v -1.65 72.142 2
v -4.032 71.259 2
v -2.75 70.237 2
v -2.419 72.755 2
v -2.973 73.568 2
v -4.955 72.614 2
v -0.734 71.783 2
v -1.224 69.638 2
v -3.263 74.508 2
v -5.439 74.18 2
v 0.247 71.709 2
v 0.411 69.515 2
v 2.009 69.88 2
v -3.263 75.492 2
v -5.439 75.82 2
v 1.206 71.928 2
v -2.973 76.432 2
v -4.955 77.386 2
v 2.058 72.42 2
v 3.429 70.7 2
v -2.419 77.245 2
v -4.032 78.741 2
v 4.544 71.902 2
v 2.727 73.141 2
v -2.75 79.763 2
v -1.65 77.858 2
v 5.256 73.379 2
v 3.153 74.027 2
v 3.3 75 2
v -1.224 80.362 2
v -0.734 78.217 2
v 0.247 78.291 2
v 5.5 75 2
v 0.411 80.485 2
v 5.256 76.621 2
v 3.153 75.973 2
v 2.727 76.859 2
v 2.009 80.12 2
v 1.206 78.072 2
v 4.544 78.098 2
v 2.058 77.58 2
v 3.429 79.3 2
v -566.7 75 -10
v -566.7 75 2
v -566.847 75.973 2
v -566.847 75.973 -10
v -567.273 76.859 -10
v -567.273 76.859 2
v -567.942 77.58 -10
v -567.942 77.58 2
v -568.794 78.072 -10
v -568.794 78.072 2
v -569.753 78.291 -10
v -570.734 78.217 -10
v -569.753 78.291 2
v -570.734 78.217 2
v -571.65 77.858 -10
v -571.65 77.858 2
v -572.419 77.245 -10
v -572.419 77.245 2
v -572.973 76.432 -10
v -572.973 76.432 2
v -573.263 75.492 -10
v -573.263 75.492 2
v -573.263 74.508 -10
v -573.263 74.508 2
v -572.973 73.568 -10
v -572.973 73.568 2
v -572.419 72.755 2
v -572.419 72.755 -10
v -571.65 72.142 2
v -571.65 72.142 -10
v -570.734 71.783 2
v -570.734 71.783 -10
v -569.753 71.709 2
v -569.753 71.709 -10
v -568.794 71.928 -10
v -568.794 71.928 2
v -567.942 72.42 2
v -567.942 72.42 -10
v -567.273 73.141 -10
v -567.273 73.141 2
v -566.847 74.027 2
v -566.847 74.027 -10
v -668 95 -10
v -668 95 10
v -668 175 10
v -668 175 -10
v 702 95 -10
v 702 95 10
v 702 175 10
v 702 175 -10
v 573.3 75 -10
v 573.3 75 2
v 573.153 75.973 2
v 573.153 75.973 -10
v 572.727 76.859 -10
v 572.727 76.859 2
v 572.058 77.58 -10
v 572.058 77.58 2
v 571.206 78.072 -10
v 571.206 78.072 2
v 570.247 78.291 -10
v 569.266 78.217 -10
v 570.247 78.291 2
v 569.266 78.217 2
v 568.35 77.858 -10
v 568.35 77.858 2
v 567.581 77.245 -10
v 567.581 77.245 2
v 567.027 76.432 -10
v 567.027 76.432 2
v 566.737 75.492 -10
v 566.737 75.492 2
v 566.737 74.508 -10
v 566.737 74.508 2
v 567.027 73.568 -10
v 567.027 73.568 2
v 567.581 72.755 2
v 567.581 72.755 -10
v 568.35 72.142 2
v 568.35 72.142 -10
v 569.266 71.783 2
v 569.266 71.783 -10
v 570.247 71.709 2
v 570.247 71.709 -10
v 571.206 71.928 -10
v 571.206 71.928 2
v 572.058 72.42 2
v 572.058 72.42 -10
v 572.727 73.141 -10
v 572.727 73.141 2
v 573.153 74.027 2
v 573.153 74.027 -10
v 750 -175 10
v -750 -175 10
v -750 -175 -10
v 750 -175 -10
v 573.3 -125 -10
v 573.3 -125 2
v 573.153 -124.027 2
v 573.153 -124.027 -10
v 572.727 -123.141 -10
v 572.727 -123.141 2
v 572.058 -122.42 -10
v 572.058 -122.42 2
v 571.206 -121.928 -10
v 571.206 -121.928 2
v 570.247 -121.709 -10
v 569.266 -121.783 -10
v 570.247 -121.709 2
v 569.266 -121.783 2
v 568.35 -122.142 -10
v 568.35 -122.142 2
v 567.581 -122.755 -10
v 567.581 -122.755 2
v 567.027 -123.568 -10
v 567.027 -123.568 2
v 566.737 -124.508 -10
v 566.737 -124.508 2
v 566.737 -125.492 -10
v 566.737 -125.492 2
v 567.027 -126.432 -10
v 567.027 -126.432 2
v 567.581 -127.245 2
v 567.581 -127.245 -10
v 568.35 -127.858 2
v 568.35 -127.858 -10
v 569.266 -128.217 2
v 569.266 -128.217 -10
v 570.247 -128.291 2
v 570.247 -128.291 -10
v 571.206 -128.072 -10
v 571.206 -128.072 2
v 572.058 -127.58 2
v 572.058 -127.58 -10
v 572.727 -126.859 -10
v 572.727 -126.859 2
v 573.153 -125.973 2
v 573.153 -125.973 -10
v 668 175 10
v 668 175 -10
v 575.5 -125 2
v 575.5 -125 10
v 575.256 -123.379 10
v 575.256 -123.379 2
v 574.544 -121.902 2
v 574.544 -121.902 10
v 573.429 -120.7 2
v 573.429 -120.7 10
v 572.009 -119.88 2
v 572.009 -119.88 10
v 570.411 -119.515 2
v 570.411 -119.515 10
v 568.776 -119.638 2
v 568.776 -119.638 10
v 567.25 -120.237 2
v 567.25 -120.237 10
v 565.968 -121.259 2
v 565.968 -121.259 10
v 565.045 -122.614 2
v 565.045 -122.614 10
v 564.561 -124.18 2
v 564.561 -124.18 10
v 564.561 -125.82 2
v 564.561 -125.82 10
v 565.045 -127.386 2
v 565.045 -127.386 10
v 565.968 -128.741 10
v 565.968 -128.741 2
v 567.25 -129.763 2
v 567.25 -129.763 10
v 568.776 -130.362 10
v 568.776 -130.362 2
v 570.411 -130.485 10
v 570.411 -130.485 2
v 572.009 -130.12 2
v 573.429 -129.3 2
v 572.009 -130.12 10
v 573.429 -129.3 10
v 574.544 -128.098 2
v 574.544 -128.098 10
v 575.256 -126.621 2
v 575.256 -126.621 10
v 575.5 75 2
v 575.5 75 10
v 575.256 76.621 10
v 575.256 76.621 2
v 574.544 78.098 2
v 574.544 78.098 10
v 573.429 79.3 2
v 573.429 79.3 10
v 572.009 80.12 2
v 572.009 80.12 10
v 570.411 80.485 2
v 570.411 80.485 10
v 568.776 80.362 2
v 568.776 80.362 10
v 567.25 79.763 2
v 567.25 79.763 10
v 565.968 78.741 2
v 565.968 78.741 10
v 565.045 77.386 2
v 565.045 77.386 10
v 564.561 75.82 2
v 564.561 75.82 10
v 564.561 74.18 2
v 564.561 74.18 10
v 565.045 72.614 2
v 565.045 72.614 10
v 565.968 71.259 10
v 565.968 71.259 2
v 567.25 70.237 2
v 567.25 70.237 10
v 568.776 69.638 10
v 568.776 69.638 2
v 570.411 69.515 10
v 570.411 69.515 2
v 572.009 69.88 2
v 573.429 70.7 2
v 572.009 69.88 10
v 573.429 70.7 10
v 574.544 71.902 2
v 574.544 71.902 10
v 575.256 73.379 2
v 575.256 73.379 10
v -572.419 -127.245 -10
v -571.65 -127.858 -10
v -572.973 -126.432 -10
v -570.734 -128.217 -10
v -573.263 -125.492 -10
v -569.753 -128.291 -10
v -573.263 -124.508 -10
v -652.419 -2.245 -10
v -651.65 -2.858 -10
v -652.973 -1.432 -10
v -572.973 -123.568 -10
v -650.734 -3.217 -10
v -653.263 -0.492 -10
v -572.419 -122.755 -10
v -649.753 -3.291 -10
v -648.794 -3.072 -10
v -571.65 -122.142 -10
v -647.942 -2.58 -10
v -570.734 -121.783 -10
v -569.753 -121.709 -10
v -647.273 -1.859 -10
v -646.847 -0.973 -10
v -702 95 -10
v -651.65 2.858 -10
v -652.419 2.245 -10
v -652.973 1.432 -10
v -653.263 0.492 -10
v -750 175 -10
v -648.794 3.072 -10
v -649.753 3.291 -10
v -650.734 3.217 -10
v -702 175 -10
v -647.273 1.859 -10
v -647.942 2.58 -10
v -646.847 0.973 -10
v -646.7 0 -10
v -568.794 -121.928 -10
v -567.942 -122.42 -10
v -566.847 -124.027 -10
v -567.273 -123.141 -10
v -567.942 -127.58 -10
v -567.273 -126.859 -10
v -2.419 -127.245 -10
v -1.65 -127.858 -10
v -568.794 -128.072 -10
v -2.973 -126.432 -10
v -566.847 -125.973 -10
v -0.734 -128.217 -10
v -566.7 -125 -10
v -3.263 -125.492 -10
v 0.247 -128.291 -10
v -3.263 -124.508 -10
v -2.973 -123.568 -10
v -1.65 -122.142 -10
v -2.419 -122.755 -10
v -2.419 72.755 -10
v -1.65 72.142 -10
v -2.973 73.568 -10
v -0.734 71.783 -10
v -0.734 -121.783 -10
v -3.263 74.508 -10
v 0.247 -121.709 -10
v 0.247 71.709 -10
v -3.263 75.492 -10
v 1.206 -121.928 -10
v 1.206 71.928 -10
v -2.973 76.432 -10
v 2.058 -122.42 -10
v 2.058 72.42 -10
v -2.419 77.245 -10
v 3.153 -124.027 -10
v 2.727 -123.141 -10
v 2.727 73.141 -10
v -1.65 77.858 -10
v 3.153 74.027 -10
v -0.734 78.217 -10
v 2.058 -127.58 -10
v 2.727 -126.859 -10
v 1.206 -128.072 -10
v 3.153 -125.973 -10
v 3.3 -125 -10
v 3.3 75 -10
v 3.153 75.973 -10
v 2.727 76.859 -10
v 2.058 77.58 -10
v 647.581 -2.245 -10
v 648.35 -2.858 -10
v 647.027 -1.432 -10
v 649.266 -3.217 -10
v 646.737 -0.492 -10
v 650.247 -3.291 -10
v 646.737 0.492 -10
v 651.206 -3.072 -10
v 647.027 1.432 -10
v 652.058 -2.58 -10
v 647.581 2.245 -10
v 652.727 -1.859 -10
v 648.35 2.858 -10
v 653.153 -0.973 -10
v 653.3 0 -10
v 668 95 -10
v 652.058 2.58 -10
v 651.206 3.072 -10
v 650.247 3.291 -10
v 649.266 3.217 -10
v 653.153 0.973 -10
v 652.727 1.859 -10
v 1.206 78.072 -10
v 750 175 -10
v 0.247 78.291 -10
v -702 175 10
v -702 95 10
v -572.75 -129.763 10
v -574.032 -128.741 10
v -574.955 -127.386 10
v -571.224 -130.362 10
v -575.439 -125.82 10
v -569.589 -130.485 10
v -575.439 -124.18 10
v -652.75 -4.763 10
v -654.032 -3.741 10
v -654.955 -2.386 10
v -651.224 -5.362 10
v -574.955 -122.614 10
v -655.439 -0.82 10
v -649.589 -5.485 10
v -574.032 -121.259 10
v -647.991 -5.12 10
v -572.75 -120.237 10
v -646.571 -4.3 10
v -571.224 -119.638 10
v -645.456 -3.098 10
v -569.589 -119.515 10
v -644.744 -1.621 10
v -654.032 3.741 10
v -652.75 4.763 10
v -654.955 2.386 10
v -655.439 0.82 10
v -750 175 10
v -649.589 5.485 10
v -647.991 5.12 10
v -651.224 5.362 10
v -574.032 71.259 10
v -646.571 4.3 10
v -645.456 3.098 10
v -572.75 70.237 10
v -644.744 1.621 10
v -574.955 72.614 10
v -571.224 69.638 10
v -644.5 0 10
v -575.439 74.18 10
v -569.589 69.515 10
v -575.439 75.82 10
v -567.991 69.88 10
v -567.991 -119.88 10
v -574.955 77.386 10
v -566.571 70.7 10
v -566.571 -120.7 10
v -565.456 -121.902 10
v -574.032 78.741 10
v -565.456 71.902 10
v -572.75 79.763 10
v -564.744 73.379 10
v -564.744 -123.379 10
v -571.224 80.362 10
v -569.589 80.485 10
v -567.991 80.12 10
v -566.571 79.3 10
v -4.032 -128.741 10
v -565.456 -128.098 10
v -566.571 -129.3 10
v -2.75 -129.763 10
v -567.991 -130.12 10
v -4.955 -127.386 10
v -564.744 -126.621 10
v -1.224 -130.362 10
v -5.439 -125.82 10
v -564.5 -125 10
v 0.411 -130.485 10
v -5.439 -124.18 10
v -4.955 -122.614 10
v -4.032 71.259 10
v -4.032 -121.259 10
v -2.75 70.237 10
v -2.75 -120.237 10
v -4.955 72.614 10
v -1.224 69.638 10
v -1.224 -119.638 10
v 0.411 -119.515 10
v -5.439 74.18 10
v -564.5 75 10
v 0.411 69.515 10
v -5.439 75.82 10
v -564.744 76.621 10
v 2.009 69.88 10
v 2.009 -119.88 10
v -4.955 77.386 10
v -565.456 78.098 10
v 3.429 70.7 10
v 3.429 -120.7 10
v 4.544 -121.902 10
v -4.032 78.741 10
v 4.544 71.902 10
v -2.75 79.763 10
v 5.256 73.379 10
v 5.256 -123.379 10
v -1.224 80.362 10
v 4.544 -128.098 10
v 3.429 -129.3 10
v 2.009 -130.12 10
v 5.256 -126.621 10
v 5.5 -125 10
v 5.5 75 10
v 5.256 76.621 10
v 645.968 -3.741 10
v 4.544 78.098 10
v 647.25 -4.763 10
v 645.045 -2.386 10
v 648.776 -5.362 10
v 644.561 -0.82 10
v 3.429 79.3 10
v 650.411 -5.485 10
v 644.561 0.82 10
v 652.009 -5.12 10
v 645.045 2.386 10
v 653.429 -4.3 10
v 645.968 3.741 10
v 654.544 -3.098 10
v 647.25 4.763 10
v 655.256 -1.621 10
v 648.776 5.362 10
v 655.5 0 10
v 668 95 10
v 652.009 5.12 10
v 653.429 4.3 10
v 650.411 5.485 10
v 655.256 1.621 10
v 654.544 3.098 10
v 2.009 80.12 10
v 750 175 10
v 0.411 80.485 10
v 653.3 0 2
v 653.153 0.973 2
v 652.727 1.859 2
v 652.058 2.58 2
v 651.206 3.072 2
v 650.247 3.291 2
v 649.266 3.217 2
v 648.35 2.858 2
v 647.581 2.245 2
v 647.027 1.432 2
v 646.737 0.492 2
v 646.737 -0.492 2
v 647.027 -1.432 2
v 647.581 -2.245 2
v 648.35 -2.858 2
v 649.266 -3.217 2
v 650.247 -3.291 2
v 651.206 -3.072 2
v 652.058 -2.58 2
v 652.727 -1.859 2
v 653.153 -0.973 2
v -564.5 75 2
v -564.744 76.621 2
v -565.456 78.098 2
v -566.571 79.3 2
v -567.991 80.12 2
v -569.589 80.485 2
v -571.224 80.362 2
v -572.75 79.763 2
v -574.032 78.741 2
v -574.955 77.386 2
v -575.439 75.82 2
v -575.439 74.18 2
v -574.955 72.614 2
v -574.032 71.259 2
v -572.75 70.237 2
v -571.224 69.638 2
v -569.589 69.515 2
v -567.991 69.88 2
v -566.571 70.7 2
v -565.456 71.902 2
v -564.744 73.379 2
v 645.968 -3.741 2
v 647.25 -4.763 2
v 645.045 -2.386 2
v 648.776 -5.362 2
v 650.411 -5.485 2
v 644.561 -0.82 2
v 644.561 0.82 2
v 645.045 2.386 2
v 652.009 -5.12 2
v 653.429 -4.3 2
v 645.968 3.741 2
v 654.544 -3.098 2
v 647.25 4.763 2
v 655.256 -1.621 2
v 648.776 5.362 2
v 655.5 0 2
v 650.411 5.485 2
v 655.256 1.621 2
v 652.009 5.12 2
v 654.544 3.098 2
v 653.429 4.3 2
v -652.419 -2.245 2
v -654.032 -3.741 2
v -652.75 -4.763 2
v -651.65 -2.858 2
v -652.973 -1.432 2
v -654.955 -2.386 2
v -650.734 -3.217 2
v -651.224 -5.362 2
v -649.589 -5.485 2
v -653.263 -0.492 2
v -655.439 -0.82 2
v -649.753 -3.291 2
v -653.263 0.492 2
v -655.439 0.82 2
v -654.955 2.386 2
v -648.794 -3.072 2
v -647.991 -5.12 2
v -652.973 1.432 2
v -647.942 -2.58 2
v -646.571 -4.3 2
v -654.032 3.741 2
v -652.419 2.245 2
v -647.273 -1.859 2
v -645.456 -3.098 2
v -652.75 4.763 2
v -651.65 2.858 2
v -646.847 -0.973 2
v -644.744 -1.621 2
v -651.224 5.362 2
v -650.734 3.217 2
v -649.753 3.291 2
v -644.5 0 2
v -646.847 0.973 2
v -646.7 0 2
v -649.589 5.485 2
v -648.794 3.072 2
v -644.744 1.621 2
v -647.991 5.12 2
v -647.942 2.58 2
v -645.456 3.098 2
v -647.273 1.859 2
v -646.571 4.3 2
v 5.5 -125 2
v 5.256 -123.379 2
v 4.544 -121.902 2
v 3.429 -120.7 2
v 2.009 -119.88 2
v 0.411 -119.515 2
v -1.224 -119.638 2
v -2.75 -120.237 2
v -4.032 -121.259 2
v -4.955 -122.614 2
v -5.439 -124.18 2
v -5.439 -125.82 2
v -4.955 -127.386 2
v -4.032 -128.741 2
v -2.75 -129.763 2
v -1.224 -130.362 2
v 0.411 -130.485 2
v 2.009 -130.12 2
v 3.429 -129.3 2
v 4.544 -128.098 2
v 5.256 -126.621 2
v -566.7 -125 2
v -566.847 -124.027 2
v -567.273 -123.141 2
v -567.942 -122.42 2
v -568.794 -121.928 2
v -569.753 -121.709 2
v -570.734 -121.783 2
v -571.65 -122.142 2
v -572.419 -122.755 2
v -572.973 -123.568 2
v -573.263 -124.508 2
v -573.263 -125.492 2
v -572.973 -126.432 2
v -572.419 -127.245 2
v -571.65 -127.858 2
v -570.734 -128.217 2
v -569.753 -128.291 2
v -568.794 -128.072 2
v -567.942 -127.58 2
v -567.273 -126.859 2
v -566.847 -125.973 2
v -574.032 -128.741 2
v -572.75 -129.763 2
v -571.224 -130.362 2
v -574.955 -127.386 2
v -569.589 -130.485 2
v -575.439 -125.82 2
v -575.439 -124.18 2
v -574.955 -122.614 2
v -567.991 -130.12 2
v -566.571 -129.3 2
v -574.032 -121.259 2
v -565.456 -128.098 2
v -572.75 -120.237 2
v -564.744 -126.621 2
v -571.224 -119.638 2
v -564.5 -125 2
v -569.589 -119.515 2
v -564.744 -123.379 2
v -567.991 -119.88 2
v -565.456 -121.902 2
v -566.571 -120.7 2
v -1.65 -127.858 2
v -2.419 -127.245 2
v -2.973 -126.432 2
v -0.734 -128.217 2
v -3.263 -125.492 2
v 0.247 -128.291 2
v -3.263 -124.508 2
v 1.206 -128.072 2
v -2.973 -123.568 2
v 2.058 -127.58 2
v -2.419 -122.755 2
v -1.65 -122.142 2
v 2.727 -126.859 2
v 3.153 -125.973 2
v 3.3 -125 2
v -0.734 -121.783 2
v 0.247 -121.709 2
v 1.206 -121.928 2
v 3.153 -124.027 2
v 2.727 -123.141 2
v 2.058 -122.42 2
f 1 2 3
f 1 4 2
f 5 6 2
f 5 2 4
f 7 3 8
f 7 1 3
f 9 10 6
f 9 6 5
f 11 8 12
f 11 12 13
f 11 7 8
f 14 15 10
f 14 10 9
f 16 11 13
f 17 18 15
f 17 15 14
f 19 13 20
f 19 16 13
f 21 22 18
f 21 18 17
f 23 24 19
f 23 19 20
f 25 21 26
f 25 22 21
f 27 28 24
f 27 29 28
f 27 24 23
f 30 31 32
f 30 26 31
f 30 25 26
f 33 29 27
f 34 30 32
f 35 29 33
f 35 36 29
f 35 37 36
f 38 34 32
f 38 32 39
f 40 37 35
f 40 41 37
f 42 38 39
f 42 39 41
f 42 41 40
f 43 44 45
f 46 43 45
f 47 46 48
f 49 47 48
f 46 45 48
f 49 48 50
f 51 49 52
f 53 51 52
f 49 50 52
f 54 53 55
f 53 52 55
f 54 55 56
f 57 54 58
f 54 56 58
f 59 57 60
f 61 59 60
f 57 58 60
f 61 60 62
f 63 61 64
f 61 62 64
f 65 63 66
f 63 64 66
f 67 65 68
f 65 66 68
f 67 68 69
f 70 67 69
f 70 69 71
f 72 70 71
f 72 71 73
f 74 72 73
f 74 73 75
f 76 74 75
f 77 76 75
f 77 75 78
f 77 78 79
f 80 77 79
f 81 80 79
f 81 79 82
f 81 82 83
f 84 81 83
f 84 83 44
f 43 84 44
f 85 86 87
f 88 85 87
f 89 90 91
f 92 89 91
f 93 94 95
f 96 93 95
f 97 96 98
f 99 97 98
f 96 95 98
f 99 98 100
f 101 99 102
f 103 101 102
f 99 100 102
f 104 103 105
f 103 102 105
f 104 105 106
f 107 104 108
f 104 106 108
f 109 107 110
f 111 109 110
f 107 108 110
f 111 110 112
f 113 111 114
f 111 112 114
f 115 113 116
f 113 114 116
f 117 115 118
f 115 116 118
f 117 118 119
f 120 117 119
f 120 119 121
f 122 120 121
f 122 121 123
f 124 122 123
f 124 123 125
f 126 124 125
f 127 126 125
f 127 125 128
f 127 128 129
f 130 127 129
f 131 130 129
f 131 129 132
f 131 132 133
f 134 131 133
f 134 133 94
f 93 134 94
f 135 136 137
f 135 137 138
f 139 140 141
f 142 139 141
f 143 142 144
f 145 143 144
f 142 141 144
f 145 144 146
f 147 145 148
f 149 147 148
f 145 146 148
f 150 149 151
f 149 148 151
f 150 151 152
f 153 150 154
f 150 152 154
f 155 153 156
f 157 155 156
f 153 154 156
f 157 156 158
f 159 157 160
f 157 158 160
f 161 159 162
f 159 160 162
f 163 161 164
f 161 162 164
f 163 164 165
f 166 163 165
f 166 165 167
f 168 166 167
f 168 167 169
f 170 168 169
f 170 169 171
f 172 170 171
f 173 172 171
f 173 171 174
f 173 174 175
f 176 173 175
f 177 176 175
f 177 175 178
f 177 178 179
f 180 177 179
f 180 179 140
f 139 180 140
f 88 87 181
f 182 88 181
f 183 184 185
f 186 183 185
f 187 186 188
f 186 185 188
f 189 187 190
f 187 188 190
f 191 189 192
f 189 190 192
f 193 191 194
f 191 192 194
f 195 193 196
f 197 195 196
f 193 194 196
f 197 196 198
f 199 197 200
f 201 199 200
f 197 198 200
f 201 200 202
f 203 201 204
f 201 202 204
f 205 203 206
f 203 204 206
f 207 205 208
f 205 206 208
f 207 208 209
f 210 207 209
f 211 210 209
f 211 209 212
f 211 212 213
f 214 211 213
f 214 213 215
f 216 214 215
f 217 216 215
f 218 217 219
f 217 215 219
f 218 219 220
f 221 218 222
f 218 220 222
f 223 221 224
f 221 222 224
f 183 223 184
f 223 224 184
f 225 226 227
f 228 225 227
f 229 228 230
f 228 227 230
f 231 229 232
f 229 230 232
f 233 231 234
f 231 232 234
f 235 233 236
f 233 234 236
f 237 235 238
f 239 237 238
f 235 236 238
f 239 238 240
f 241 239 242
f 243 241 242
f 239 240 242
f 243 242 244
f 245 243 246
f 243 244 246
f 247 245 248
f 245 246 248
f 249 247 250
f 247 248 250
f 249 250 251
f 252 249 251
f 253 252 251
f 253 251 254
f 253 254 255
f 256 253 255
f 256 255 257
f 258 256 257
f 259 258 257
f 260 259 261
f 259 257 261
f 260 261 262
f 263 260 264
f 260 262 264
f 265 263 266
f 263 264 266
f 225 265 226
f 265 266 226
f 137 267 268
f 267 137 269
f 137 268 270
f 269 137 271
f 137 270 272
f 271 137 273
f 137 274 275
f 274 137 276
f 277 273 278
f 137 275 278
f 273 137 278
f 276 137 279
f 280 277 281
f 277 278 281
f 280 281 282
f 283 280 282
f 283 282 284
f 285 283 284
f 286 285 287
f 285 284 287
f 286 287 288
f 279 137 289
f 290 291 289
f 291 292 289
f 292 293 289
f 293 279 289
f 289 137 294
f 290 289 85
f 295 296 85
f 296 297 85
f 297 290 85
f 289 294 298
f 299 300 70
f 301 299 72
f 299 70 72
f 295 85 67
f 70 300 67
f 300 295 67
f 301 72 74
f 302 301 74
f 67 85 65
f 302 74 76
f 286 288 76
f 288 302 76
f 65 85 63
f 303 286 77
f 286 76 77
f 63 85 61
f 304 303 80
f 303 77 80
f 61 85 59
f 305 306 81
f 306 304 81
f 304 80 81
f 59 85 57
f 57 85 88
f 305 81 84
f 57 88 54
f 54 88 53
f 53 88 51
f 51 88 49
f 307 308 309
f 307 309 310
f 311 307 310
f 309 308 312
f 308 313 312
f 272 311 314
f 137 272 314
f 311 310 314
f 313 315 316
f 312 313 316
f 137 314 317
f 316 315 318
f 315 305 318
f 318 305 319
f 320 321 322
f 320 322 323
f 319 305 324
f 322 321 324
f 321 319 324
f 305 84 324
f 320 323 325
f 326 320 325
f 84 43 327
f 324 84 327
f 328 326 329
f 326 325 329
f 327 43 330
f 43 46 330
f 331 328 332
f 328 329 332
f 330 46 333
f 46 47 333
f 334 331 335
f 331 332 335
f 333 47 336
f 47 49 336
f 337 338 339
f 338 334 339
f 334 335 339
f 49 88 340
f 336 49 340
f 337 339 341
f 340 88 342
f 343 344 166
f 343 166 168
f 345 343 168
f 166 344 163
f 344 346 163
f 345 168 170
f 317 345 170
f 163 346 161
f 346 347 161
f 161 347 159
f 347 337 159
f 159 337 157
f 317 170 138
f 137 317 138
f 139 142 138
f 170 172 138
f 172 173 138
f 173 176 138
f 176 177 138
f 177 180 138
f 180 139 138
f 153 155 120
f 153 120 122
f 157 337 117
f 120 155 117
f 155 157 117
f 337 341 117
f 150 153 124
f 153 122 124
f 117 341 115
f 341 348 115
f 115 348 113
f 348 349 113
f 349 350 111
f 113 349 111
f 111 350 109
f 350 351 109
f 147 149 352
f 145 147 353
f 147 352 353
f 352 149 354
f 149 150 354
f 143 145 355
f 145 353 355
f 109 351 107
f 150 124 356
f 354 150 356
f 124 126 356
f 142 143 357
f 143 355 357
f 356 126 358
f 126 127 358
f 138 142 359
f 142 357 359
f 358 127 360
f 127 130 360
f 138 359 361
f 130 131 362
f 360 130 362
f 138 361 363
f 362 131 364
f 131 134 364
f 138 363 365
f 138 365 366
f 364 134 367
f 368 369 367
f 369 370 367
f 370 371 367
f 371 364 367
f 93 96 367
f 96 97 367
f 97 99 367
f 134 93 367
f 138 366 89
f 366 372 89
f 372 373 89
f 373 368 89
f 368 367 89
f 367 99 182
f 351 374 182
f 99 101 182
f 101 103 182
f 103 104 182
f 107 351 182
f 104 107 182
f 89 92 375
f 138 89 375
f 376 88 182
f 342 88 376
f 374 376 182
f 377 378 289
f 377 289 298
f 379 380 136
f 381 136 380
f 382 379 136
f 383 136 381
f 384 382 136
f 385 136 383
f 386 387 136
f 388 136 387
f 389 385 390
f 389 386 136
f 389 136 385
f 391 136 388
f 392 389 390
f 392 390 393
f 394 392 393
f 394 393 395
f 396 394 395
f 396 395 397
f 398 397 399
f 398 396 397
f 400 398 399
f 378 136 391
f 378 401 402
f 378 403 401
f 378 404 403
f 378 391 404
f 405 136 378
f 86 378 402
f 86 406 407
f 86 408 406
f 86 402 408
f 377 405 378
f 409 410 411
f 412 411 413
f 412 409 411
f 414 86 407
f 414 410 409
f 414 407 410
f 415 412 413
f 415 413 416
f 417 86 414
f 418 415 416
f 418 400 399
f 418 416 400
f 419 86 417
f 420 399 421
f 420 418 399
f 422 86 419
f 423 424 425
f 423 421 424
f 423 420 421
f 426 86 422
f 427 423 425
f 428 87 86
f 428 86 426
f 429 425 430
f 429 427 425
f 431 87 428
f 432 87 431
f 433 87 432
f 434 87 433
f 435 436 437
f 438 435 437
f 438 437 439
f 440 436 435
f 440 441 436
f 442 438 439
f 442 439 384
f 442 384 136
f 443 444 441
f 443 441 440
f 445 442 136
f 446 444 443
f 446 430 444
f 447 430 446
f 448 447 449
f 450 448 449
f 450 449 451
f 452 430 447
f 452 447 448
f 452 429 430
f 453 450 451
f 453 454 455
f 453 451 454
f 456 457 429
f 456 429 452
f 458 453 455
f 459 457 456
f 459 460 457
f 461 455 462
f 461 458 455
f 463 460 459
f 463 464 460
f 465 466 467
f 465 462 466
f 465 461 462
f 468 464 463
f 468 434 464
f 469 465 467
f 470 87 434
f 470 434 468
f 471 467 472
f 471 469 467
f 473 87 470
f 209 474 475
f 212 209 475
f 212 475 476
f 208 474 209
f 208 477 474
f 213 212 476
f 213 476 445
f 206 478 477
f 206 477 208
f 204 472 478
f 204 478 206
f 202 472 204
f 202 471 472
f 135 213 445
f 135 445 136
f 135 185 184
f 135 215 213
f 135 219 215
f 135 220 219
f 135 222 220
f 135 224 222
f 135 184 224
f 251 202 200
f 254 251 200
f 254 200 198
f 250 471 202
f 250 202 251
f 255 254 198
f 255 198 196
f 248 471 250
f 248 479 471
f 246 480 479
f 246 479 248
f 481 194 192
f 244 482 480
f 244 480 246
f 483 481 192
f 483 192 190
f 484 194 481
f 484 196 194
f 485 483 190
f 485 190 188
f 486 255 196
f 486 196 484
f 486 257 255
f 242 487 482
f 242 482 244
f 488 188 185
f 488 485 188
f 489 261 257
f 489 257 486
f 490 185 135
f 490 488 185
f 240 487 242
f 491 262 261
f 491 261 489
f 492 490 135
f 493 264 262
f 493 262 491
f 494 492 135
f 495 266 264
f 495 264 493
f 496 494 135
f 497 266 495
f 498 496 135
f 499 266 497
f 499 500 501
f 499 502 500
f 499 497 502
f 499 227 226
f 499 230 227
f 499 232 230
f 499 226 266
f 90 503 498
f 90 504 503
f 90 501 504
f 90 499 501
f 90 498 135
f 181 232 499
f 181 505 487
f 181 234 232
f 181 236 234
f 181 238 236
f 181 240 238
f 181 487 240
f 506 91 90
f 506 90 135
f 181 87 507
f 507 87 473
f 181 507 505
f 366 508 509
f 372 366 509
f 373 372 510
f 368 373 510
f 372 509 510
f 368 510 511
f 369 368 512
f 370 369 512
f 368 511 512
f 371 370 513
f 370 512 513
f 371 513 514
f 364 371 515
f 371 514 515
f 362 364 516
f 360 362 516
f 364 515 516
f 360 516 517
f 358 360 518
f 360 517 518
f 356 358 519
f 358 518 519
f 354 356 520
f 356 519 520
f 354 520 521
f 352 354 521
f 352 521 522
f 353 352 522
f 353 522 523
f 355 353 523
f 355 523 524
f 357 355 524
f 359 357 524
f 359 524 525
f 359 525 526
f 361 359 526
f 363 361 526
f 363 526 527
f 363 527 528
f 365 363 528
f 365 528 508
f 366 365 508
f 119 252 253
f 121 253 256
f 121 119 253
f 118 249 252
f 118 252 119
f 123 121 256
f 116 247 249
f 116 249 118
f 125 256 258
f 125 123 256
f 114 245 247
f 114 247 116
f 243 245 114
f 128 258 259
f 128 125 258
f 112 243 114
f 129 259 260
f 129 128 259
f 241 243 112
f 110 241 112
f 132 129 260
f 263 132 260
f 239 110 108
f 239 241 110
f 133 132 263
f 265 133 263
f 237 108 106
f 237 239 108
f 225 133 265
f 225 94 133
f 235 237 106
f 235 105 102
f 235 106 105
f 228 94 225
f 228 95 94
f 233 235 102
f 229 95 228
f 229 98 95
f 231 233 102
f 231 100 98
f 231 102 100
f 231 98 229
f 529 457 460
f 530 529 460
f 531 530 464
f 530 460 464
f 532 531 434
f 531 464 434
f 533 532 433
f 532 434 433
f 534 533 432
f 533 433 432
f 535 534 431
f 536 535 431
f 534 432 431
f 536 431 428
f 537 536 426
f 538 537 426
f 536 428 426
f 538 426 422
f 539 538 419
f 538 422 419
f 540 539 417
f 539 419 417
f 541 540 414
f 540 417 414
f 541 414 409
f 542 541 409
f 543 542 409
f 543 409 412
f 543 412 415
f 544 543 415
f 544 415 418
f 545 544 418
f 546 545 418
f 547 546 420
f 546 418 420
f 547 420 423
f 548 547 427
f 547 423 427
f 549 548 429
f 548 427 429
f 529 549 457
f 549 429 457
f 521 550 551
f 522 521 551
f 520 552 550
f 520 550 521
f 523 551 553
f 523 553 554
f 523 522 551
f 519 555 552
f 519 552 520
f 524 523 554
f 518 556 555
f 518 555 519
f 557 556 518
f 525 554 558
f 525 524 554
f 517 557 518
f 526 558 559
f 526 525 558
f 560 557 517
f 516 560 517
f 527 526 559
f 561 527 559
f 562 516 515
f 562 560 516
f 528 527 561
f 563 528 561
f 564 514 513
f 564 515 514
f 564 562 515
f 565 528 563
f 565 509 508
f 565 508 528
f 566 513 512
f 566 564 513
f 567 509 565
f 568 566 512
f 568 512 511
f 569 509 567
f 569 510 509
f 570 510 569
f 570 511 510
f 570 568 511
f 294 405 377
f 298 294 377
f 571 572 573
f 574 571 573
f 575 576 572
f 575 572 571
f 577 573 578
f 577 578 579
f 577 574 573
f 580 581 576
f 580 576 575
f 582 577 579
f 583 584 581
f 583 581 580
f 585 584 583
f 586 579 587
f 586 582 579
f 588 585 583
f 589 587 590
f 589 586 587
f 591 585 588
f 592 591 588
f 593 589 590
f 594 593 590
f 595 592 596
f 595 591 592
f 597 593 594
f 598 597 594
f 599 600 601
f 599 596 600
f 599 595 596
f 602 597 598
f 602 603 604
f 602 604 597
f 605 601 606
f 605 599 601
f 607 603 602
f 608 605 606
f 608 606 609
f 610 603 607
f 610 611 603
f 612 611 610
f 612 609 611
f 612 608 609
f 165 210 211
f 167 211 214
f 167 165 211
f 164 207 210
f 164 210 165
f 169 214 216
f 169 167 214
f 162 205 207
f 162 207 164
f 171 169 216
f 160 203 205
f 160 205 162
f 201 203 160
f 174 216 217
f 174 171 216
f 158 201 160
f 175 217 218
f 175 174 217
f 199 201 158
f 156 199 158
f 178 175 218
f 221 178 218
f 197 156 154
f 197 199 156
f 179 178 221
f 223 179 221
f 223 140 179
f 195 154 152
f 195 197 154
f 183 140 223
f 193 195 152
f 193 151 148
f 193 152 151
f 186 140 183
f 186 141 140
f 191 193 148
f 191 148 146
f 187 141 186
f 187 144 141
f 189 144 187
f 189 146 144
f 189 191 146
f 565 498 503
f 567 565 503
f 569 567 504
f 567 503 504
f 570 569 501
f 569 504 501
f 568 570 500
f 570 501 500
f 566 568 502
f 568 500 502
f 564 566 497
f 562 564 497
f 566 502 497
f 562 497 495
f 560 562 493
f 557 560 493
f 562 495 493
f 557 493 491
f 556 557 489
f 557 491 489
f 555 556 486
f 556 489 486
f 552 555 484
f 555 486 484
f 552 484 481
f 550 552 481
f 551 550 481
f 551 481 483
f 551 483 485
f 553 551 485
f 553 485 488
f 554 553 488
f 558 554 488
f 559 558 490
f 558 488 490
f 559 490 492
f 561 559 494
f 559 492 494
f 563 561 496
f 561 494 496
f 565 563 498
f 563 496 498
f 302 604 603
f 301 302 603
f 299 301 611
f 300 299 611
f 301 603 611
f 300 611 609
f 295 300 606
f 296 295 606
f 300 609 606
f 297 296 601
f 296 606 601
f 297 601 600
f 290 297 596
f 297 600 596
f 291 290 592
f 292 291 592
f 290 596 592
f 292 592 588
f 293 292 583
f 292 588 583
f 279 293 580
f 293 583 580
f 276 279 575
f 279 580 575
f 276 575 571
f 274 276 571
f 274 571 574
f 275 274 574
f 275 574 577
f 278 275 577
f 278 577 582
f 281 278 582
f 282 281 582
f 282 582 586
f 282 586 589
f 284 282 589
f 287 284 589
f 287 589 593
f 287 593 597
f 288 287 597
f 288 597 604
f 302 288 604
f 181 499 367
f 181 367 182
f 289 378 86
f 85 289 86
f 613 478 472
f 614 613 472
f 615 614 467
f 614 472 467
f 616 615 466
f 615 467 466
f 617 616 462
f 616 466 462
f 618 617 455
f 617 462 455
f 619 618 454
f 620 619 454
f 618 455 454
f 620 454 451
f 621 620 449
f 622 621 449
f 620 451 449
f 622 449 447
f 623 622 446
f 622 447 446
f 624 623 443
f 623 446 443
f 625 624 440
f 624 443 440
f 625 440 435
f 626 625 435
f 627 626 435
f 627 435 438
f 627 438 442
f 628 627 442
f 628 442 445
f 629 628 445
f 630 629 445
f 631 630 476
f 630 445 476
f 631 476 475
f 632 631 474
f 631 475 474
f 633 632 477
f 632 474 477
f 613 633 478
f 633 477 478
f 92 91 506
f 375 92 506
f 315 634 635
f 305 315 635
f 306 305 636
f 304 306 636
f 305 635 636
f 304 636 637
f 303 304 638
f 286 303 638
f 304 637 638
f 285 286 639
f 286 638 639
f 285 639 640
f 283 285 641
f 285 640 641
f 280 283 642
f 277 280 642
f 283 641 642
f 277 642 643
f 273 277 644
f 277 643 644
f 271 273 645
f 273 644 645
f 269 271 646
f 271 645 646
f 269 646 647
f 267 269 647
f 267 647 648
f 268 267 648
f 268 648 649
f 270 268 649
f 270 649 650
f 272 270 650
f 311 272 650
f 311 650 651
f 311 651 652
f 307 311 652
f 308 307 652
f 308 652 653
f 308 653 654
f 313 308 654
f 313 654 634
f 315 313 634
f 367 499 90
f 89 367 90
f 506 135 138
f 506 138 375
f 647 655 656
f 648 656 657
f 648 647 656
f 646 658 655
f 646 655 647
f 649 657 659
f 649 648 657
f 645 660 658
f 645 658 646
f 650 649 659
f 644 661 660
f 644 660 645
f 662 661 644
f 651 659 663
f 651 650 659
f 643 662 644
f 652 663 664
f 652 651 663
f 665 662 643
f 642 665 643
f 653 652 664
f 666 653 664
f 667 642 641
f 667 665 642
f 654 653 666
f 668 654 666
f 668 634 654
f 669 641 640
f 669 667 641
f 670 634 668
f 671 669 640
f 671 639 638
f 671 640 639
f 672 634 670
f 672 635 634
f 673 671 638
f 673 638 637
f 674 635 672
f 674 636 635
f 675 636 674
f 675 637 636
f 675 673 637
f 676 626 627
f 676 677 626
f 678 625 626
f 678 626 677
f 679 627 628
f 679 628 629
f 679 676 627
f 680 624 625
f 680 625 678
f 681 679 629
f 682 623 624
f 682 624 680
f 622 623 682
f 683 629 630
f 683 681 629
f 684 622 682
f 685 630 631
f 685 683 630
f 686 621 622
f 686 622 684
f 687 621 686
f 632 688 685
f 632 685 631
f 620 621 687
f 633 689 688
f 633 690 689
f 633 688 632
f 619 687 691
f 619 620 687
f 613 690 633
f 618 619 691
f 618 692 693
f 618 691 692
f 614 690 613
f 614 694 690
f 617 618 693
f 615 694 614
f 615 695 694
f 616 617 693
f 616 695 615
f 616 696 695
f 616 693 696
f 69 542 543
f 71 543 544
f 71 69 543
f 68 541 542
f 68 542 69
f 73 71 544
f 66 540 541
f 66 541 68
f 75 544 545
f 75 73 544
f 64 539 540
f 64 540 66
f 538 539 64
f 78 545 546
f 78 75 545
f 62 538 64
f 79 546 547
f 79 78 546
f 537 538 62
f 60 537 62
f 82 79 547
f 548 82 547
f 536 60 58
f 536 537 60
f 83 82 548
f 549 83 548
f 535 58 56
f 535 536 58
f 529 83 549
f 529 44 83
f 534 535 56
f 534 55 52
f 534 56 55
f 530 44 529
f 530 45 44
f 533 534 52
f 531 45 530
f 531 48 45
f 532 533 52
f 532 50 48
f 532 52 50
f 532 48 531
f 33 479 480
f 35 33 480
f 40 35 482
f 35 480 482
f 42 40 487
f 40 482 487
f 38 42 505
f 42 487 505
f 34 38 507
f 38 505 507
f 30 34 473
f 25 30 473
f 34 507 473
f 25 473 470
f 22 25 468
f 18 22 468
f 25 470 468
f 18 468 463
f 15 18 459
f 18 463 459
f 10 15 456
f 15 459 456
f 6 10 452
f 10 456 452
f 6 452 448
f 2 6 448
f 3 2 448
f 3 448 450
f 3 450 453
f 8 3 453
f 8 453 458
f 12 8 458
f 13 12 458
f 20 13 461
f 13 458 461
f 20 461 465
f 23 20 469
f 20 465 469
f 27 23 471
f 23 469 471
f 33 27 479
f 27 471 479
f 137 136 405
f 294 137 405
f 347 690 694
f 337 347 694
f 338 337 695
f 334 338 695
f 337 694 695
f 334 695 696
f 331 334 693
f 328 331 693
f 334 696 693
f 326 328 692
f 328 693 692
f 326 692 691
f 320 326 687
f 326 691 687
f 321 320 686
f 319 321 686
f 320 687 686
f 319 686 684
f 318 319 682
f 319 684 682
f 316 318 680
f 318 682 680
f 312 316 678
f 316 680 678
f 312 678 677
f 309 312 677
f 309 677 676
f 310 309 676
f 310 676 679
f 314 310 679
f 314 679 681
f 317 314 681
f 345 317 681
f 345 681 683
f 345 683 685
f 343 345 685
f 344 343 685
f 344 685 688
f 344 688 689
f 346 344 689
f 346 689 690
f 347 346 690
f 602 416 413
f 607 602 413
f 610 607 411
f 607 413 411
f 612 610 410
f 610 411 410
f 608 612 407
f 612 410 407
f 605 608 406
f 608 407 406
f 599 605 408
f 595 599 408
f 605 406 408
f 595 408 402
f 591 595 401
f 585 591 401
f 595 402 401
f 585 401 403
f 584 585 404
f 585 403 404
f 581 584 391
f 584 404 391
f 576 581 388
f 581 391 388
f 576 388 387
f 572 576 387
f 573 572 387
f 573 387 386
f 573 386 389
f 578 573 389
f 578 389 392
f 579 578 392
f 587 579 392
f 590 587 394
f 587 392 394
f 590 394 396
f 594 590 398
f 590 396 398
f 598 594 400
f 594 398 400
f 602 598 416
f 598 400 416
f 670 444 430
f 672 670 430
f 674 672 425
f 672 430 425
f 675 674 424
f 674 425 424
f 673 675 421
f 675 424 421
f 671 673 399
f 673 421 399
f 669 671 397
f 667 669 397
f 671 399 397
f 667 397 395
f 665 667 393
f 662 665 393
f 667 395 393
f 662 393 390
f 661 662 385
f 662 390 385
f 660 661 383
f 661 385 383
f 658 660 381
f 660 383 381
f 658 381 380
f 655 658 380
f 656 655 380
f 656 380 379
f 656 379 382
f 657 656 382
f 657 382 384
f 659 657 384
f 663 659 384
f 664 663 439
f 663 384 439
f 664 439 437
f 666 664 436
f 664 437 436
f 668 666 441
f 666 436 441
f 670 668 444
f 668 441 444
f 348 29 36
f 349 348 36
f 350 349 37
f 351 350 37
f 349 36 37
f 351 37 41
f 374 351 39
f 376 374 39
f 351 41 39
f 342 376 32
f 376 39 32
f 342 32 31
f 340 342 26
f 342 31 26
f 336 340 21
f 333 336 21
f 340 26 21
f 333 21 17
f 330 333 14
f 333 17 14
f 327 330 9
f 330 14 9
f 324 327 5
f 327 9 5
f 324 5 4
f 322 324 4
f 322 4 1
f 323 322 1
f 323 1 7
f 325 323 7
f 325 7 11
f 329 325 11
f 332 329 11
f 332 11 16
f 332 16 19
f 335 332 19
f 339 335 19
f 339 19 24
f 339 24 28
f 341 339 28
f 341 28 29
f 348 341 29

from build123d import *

# Parameters (mm, degrees)
F0_W     = 1500
F0_H     = 350
F1_DEPTH = 10
F2_W     = 34
F2_H     = 80
F3_DEPTH = 20.001
F4_R     = 3.3
F5_DEPTH = 20.001
F6_R     = 5.5
F7_DEPTH = 8


with BuildPart() as f1:
    # F0 (on Top) → F1 (new body, symmetric)
    with BuildSketch(Plane.XY):
        Rectangle(F0_W, F0_H)
    extrude(amount=F1_DEPTH, both=True)

    # F2 (on face) → F3 (cut, through all)
    with BuildSketch(Plane.XY.offset(10)):
        with Locations((685, 135)):
            Rectangle(F2_W, F2_H)
        with Locations((-685, 135)):
            Rectangle(F2_W, F2_H)
    extrude(amount=-F3_DEPTH, mode=Mode.SUBTRACT)

    # F4 (on face) → F5 (cut, through all)
    with BuildSketch(Plane.XY.offset(10)):
        with Locations((-570, 75)):
            Circle(F4_R)
        with Locations((0, 75)):
            Circle(F4_R)
        with Locations((570, 75)):
            Circle(F4_R)
        with Locations((-570, -125)):
            Circle(F4_R)
        with Locations((0, -125)):
            Circle(F4_R)
        with Locations((570, -125)):
            Circle(F4_R)
        with Locations((-650, 0)):
            Circle(F4_R)
        with Locations((650, 0)):
            Circle(F4_R)
    extrude(amount=-F5_DEPTH, mode=Mode.SUBTRACT)

    # F6 (on face) → F7 (cut)
    with BuildSketch(Plane.XY.offset(10)):
        with Locations((-570, 75)):
            Circle(F6_R)
        with Locations((-650, 0)):
            Circle(F6_R)
        with Locations((-570, -125)):
            Circle(F6_R)
        with Locations((0, -125)):
            Circle(F6_R)
        with Locations((570, -125)):
            Circle(F6_R)
        with Locations((650, 0)):
            Circle(F6_R)
        with Locations((570, 75)):
            Circle(F6_R)
        with Locations((0, 75)):
            Circle(F6_R)
    extrude(amount=-F7_DEPTH, mode=Mode.SUBTRACT)


solid = f1.part
